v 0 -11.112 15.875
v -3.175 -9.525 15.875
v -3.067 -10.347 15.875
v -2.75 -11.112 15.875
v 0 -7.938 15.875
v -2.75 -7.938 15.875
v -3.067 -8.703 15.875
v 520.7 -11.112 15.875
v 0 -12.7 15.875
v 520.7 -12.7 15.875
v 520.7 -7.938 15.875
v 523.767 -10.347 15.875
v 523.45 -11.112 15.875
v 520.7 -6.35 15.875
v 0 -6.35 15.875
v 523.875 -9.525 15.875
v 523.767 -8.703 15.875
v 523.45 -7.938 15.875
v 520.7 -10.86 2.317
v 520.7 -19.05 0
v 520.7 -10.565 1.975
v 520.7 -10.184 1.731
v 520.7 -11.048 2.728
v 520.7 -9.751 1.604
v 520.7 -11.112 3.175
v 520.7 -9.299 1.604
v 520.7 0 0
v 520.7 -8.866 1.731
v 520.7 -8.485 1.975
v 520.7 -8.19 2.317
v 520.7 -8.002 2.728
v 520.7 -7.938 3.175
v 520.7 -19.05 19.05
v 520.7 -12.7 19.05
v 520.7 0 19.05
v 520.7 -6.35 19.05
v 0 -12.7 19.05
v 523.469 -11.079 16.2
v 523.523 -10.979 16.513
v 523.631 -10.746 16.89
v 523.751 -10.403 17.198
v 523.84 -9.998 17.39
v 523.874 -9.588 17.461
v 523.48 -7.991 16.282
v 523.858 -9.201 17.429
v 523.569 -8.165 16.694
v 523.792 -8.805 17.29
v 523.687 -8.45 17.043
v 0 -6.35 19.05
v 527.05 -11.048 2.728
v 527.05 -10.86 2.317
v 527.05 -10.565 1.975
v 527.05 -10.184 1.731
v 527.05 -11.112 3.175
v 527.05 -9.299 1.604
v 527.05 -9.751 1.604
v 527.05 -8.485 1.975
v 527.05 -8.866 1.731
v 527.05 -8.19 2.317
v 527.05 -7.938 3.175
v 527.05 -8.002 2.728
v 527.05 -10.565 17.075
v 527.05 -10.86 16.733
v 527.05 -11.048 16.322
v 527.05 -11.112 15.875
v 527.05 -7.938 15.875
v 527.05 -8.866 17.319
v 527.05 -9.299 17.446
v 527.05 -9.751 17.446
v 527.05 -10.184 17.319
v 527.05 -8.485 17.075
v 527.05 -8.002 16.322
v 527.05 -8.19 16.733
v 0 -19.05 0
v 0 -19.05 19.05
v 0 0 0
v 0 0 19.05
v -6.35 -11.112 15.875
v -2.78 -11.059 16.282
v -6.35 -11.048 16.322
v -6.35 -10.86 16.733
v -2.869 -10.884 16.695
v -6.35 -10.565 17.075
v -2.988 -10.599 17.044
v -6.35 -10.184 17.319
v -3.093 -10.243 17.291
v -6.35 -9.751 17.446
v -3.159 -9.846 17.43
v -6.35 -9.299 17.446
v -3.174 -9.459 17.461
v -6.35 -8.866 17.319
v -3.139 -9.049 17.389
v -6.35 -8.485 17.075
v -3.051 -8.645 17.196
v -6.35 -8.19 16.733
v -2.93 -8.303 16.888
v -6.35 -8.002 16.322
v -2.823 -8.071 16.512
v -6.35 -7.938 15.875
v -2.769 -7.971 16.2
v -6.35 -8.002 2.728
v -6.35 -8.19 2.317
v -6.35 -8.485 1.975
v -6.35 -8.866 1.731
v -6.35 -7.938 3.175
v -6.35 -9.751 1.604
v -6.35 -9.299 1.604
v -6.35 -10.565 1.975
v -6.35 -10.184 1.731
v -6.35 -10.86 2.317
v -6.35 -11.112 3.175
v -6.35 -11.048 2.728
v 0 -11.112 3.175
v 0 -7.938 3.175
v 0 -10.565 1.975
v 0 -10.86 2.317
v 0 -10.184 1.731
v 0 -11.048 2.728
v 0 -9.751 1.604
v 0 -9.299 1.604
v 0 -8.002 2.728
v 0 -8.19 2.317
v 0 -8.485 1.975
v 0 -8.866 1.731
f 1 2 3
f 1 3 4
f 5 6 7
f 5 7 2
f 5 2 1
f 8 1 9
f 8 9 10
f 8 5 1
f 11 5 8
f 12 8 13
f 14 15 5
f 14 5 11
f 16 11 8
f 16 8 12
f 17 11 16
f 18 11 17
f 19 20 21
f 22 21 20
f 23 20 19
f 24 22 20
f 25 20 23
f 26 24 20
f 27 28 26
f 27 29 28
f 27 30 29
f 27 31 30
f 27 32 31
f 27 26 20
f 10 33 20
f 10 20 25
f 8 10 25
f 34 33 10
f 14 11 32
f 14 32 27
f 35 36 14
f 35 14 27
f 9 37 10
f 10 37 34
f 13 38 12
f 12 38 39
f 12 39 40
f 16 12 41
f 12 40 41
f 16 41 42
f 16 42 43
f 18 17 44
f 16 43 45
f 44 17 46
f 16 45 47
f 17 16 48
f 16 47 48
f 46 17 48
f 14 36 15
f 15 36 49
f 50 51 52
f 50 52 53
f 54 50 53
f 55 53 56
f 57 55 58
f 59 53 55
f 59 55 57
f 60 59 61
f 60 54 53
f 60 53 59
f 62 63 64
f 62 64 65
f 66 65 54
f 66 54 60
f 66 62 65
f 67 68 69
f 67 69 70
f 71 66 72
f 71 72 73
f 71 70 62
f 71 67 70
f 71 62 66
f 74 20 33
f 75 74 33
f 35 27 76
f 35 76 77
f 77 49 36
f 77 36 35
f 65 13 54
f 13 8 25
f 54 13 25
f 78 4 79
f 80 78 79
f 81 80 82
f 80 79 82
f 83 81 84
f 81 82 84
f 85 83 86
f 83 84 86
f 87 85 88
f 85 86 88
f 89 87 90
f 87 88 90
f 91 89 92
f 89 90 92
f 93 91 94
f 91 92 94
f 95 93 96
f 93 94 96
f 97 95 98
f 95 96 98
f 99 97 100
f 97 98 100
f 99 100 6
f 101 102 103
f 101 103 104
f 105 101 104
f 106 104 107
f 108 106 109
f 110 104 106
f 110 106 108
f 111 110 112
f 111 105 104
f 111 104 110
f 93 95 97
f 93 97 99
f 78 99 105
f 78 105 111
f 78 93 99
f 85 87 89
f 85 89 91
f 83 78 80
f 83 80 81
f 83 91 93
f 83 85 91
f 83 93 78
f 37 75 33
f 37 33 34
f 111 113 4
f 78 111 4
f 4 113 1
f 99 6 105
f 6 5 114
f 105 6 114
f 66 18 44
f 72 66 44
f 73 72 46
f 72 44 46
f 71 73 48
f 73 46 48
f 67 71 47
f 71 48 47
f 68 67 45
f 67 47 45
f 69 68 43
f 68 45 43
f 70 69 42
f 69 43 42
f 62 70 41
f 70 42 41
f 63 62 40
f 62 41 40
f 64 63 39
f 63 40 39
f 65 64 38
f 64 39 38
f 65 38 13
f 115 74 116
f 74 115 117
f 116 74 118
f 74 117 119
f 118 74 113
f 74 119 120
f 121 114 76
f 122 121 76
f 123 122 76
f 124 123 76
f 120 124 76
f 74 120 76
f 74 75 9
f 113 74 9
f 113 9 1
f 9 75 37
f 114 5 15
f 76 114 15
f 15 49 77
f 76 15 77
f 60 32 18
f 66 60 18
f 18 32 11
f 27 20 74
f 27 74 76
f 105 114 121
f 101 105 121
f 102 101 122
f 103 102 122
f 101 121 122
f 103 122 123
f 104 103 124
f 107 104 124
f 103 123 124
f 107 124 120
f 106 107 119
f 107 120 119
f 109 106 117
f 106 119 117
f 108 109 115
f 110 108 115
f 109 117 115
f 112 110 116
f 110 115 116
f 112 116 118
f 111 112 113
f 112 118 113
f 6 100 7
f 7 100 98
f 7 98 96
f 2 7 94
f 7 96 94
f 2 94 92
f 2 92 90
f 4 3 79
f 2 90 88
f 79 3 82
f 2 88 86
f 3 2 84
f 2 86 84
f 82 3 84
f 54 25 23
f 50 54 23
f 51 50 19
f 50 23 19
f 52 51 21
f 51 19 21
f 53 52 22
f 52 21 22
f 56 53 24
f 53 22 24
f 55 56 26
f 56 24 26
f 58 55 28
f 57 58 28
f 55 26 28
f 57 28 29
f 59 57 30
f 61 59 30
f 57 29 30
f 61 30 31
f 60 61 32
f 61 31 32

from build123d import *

# Parameters (mm, degrees)
F0_W     = 19.05
F0_H     = 19.05
F1_DEPTH = 520.7
F3_DEPTH = 6.35
F5_DEPTH = 6.35
F7_DEPTH = 3.175


with BuildPart() as f1:
    # F0 (on Right) → F1 (new body)
    with BuildSketch(Plane.YZ):
        with Locations((-9.525, 9.525)):
            Rectangle(F0_W, F0_H)
    extrude(amount=F1_DEPTH)

    # F2 (on face) → F3 (join)
    with BuildSketch(Plane.YZ.offset(520.7)):
        with BuildLine():
            ThreePointArc((-7.9375, 15.875), (-9.525, 17.4625), (-11.1125, 15.875))
            Line((-11.1125, 15.875), (-11.1125, 3.175))
            ThreePointArc((-11.1125, 3.175), (-9.525, 1.5875), (-7.9375, 3.175))
            Line((-7.9375, 3.175), (-7.9375, 15.875))
        make_face()
    extrude(amount=F3_DEPTH)

    # F4 (on face) → F5 (join)
    with BuildSketch(Plane(origin=(0, 0, 0), x_dir=(0, -1, 0), z_dir=(-1, 0, 0))):
        with BuildLine():
            ThreePointArc((11.1125, 15.875), (9.525, 17.4625), (7.9375, 15.875))
            Line((7.9375, 15.875), (7.9375, 3.175))
            ThreePointArc((7.9375, 3.175), (9.525, 1.5875), (11.1125, 3.175))
            Line((11.1125, 3.175), (11.1125, 15.875))
        make_face()
    extrude(amount=F5_DEPTH)

    # F6 (on face) → F7 (cut)
    with BuildSketch(Plane.XY.offset(19.05)):
        with BuildLine():
            ThreePointArc((0, -6.35), (-3.175, -9.525), (0, -12.7))
            Line((0, -12.7), (520.7, -12.7))
            ThreePointArc((520.7, -12.7), (523.875, -9.525), (520.7, -6.35))
            Line((520.7, -6.35), (0, -6.35))
        make_face()
    extrude(amount=-F7_DEPTH, mode=Mode.SUBTRACT)


solid = f1.part
